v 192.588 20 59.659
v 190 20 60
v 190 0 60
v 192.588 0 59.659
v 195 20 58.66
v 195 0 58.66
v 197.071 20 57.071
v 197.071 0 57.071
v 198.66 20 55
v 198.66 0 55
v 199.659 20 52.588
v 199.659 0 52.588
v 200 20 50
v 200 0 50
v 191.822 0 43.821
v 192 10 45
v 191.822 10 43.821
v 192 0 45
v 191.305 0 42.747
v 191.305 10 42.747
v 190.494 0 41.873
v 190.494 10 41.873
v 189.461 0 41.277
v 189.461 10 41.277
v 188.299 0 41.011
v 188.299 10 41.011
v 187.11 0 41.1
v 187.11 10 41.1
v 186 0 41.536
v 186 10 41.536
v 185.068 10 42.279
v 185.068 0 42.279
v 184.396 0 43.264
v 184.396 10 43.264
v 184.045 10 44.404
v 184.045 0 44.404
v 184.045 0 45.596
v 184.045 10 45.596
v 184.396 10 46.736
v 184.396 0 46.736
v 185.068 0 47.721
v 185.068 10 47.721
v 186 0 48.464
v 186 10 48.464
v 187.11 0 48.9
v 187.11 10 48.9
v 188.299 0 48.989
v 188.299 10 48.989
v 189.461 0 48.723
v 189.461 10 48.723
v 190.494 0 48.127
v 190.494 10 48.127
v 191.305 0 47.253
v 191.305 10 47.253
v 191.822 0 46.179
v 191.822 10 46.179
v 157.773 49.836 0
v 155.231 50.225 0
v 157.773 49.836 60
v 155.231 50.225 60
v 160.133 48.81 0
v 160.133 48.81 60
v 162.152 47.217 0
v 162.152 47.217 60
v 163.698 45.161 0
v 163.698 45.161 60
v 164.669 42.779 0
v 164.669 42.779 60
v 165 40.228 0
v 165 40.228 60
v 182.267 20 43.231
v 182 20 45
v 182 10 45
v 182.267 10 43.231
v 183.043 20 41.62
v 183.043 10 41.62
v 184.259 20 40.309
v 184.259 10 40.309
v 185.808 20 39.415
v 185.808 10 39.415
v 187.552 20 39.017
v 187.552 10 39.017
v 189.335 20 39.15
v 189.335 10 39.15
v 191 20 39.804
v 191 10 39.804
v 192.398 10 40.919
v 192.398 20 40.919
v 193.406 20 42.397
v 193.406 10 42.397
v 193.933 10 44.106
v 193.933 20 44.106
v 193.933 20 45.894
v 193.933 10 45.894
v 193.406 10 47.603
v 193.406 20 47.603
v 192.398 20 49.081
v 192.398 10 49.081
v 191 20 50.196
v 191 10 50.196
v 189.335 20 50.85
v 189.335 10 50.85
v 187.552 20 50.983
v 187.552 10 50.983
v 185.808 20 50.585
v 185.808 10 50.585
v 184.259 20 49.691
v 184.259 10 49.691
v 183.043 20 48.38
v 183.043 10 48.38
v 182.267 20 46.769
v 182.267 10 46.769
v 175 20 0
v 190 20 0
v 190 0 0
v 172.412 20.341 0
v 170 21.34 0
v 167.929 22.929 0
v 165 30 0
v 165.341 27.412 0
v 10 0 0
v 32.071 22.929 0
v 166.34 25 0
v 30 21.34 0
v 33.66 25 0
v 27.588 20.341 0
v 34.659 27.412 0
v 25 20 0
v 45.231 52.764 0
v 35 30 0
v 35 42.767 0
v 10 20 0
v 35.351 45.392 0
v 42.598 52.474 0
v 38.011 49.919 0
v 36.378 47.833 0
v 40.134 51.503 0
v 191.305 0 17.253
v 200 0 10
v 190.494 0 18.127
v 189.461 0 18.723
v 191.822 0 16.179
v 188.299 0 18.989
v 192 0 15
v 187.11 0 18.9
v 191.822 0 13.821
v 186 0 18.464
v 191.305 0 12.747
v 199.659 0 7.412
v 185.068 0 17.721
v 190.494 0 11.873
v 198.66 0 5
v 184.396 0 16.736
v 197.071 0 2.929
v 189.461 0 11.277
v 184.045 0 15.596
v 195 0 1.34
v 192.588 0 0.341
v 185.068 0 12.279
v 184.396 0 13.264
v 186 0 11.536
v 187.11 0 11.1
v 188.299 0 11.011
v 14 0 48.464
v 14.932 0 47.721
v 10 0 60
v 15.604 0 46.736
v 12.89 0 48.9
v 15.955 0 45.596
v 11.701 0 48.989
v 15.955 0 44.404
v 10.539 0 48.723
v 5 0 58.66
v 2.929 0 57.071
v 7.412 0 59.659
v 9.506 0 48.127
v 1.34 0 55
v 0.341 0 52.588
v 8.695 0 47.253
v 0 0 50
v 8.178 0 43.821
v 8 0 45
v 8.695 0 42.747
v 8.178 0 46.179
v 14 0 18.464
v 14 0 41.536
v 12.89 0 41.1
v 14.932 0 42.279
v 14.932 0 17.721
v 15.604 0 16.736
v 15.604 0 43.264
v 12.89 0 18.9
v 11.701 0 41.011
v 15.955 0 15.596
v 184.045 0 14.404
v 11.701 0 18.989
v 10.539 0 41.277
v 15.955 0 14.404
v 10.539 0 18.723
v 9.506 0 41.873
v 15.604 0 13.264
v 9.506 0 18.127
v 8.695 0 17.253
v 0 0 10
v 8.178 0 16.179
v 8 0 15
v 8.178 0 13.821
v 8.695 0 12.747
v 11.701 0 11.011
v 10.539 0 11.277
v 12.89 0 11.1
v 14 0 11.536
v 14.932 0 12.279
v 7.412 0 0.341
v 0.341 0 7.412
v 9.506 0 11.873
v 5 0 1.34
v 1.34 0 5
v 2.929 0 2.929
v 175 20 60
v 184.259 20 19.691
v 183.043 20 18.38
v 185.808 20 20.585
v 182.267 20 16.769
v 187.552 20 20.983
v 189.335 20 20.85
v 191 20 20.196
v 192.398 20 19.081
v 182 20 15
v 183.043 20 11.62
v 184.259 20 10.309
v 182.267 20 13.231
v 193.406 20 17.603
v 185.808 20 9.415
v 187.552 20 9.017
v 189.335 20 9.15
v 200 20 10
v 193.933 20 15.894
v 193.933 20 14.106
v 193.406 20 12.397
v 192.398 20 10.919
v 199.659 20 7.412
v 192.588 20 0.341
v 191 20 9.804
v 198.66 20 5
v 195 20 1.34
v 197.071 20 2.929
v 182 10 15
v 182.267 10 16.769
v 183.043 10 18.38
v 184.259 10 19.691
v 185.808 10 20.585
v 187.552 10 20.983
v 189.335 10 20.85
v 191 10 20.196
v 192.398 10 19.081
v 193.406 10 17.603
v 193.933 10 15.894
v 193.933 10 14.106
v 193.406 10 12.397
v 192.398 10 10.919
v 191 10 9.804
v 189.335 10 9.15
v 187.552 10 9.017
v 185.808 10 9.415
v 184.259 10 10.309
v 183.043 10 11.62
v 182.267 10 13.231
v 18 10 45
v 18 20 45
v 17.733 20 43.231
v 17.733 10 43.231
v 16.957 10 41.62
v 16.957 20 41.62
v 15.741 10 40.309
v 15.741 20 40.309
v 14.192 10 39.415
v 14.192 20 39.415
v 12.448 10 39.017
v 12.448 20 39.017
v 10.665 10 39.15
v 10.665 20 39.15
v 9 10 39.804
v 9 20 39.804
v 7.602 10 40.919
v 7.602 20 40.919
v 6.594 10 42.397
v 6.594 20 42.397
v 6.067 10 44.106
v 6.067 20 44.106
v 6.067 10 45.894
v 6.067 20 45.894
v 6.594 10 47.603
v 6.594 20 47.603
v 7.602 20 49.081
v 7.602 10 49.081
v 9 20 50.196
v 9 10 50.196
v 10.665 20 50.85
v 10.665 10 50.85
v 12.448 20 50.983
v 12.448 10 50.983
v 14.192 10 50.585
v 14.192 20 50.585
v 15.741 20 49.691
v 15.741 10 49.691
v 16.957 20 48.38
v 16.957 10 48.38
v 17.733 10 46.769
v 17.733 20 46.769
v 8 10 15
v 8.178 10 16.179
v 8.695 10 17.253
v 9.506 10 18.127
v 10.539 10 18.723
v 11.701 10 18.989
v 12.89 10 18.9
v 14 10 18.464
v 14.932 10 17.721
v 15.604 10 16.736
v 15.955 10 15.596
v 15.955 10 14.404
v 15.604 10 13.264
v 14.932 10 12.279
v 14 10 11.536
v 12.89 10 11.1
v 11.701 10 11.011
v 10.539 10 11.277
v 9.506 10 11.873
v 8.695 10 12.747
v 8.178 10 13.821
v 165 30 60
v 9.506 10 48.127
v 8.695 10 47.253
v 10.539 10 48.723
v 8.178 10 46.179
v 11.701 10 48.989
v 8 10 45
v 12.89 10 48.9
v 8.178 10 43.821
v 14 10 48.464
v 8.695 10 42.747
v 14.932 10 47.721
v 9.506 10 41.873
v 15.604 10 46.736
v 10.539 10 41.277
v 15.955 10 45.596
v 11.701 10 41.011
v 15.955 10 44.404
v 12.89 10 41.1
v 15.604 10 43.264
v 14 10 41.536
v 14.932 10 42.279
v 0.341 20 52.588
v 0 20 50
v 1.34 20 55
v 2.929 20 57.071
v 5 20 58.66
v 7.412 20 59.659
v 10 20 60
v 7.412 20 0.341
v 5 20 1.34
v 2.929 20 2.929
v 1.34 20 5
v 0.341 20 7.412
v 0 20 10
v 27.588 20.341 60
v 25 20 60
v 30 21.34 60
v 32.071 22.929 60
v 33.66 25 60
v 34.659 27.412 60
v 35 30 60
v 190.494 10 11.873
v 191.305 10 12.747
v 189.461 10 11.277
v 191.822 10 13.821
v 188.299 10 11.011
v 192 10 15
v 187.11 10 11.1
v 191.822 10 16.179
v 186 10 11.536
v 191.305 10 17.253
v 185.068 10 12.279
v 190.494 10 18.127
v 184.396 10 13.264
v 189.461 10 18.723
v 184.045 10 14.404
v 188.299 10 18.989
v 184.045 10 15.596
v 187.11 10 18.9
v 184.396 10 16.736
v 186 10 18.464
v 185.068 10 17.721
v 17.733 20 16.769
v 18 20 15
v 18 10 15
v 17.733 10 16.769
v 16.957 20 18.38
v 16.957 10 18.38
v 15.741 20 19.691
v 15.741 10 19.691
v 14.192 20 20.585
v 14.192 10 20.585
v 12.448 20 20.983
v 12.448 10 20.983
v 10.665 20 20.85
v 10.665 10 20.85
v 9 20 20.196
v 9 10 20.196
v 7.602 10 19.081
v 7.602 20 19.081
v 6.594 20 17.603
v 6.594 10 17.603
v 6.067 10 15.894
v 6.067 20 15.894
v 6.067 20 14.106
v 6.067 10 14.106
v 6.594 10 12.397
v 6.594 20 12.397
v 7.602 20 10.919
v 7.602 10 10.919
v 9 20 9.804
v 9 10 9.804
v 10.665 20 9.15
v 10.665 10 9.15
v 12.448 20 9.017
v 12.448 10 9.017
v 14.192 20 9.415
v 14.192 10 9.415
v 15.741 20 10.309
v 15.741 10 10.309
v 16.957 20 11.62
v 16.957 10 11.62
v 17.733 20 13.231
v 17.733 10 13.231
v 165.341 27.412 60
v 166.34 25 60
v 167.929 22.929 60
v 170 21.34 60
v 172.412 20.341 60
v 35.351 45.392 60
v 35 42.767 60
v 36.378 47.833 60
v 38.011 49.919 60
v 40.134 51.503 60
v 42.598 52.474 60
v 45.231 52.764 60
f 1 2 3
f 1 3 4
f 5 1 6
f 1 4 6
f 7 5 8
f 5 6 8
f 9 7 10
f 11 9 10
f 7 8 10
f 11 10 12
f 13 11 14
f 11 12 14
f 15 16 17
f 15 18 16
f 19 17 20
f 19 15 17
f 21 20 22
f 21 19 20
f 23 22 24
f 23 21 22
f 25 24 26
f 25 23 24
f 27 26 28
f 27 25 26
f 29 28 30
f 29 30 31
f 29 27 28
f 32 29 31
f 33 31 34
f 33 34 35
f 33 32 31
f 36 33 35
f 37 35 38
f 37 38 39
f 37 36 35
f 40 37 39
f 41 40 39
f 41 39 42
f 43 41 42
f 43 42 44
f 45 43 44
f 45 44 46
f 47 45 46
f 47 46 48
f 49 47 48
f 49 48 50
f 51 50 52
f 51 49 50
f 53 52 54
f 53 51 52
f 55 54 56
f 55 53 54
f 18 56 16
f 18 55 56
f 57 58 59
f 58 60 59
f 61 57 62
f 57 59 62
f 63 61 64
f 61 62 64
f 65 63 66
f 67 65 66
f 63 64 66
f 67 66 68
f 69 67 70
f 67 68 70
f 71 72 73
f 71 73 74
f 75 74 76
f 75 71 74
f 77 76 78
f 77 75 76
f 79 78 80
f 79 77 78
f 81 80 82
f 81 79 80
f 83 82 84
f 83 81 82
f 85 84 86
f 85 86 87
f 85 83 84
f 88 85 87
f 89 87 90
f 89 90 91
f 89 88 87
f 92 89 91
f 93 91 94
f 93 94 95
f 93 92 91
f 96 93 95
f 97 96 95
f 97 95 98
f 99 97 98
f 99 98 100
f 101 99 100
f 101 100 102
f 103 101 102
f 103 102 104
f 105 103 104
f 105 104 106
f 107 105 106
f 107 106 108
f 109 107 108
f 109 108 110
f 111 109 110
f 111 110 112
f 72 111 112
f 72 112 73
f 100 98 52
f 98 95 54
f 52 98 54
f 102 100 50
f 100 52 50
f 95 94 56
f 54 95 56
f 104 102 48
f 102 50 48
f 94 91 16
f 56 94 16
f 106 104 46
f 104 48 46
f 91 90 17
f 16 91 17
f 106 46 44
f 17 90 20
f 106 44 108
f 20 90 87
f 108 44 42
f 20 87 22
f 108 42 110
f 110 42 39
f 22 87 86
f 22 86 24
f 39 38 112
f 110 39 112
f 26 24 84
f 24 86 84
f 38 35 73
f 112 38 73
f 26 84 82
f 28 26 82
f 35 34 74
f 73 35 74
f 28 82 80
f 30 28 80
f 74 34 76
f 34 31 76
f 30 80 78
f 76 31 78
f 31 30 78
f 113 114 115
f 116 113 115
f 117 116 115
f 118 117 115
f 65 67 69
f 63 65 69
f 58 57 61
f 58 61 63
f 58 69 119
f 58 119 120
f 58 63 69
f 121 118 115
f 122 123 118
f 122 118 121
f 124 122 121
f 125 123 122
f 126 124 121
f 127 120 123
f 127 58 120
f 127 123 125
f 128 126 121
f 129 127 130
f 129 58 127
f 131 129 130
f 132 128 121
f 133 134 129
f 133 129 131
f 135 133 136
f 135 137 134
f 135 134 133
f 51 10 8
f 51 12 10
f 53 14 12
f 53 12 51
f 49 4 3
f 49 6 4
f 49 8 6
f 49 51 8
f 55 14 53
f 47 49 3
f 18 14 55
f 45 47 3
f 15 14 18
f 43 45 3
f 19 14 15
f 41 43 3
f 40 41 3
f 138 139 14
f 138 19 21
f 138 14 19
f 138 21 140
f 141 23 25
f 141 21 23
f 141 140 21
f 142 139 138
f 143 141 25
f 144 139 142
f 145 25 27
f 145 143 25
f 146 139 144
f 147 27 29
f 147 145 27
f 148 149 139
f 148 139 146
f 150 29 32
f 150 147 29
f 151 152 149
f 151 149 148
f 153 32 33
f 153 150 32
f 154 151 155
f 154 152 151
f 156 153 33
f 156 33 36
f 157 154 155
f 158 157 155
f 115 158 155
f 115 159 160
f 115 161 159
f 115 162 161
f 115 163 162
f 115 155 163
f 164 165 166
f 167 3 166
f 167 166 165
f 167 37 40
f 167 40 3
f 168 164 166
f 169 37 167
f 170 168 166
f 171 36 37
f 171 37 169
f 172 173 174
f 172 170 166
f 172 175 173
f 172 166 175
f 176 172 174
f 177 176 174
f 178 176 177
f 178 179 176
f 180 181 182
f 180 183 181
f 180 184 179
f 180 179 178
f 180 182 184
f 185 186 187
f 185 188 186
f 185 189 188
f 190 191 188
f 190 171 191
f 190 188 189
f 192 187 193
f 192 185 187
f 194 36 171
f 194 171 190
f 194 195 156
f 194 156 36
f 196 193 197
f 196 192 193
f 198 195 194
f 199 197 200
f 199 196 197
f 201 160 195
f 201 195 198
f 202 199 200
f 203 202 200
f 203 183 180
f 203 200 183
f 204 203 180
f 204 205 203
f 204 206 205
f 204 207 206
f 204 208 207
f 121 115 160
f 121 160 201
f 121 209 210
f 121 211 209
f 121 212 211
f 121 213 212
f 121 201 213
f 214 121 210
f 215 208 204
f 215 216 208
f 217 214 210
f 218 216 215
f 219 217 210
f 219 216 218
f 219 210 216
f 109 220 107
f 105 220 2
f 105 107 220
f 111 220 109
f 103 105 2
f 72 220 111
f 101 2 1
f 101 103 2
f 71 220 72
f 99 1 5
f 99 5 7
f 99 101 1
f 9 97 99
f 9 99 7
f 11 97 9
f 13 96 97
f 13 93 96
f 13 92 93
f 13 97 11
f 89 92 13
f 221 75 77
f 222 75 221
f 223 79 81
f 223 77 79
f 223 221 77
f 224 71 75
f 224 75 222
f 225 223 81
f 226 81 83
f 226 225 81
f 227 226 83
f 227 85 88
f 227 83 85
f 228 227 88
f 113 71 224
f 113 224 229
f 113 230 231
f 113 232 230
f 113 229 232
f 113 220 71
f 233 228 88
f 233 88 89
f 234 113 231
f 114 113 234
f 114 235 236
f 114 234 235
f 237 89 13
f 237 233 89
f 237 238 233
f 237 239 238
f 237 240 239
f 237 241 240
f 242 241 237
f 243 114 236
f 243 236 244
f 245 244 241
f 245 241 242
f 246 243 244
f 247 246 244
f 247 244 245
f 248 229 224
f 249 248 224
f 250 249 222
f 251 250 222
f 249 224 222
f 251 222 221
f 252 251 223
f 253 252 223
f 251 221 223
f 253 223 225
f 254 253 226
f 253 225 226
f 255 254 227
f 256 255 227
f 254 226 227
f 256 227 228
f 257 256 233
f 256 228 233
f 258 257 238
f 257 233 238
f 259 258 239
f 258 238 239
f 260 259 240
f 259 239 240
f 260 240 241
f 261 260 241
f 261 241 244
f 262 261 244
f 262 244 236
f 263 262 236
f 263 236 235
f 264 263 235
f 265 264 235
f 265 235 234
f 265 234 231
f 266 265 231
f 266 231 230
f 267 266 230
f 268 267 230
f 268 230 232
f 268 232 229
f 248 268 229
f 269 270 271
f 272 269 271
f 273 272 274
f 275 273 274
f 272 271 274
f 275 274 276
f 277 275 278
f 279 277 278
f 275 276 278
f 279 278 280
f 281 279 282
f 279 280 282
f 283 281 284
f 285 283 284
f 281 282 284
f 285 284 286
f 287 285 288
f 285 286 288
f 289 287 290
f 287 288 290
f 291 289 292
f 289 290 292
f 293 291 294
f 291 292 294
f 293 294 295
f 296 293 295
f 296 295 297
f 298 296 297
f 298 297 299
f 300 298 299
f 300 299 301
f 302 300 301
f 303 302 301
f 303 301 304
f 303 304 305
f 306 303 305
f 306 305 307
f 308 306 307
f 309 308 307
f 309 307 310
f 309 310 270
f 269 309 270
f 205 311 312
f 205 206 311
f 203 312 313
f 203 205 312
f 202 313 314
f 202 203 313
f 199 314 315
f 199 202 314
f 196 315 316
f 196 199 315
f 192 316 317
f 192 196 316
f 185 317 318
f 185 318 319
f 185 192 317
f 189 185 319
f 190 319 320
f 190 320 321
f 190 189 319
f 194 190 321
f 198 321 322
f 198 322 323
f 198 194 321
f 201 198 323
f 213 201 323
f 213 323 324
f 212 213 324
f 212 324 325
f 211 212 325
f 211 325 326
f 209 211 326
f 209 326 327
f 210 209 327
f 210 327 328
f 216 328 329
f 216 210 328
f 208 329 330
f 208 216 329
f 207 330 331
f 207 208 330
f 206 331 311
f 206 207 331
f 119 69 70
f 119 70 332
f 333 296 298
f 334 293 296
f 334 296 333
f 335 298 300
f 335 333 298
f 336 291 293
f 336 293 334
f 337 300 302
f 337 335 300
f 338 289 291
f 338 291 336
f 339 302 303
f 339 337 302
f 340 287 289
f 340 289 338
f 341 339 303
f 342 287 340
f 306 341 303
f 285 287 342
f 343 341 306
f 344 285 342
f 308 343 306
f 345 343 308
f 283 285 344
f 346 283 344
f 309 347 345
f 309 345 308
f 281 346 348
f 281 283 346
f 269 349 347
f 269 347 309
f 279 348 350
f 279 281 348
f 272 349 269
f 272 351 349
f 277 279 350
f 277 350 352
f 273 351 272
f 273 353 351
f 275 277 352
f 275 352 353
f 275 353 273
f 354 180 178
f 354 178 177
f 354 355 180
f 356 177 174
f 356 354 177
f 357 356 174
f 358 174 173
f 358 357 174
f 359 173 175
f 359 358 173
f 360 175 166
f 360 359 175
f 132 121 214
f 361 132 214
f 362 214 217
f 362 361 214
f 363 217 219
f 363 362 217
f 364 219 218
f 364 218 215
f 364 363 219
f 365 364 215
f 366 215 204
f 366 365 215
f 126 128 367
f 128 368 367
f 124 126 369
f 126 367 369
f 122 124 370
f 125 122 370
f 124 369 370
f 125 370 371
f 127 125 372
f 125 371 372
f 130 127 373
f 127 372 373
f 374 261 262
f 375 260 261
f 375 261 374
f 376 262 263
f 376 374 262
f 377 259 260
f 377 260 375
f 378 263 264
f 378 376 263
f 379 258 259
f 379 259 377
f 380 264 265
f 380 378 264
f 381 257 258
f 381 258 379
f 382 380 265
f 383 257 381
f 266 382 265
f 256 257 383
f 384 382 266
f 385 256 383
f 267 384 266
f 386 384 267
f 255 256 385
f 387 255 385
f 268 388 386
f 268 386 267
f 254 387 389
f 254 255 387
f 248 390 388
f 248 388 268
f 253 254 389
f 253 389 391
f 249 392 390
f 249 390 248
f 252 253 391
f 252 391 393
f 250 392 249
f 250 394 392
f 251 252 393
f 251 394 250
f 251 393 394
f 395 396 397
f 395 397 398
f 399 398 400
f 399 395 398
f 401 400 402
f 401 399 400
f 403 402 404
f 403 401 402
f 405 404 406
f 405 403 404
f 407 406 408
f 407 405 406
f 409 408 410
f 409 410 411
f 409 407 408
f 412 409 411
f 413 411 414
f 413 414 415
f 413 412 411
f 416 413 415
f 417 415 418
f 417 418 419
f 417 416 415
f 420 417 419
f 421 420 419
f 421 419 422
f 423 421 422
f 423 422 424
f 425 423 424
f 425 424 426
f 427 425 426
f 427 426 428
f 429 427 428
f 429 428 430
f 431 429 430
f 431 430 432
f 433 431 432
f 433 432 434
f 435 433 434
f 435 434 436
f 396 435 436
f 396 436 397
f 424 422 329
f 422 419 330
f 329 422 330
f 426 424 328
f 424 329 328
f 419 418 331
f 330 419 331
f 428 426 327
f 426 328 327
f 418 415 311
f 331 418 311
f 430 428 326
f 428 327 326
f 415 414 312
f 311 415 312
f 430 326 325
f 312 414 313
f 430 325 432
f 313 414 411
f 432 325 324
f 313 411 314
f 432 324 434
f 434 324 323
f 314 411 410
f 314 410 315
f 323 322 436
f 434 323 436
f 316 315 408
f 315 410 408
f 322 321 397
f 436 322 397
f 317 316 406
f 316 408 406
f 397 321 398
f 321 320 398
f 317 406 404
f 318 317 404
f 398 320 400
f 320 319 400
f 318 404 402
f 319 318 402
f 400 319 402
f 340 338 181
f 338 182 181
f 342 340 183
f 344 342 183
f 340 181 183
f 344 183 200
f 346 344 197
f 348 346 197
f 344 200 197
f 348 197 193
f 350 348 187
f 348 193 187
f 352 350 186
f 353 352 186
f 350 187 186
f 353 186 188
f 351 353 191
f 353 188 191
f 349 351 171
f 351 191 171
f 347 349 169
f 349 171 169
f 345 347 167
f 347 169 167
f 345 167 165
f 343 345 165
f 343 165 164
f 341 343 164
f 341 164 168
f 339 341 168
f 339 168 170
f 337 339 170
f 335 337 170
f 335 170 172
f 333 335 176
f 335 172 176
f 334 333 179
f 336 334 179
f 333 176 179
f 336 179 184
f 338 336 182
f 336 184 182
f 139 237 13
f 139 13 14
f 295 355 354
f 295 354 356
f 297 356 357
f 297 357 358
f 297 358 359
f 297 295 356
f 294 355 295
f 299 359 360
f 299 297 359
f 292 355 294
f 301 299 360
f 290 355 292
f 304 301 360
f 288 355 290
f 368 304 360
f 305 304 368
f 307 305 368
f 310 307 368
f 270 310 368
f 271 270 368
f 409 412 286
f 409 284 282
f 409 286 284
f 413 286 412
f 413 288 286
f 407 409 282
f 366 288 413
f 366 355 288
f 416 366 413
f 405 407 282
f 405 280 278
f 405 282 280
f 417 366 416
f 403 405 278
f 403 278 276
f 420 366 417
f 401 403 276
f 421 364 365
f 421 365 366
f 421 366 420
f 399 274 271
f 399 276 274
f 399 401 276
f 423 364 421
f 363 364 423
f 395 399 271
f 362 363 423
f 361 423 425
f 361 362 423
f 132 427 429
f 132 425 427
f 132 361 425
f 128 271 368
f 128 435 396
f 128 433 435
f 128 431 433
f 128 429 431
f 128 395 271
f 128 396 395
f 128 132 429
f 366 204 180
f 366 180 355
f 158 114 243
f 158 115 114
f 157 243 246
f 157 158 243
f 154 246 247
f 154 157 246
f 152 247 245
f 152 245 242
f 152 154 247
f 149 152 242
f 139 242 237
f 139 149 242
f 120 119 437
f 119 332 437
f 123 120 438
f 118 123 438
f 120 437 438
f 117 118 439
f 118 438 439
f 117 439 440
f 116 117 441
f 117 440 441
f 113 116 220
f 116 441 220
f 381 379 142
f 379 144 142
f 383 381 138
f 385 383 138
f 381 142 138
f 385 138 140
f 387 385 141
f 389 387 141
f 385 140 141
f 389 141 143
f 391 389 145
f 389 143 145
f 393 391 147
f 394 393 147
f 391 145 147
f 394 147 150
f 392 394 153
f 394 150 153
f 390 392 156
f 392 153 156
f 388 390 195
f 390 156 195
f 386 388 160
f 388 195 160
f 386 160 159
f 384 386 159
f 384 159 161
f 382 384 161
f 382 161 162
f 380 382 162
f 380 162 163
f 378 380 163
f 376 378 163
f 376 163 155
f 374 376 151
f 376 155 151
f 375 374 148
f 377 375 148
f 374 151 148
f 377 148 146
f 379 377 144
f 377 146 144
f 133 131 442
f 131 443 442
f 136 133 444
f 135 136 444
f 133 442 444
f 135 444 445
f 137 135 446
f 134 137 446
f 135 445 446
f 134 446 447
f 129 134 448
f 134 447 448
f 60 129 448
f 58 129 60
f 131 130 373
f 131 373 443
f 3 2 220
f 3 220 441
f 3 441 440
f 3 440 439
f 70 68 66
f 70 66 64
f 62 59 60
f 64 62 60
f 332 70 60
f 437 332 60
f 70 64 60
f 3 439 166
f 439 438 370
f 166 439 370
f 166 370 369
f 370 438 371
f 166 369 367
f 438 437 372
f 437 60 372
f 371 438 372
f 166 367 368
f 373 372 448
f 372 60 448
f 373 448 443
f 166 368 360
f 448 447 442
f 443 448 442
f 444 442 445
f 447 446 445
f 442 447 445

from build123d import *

# Parameters (mm, degrees)
BOSS_EXTRUDE1_DEPTH                     = 60
CBORE_FOR_M5_HEX_HEAD_BOLT1_D           = 8
CBORE_FOR_M5_HEX_HEAD_BOLT1_CBORE_D     = 12
CBORE_FOR_M5_HEX_HEAD_BOLT1_CBORE_DEPTH = 10
MIRROR2_COPY_1_D                        = 8
MIRROR2_COPY_1_CBORE_D                  = 12
MIRROR2_COPY_1_CBORE_DEPTH              = 10
FILLET1_R                               = 10
FILLET2_R                               = 10


with BuildPart() as part:
    # Sketch1 → Boss-Extrude1 (new body)
    with BuildSketch(Plane.XY):
        Polygon((0, 0), (0, 20), (35, 20), (35, 53), (165, 50), (165, 20), (200, 20), (200, 0), align=None)
    extrude(amount=BOSS_EXTRUDE1_DEPTH)

    # CBORE for M5 Hex Head Bolt1 (through all)
    with Locations(Plane(origin=(0, 20, 0), x_dir=(1, 0, 0), z_dir=(0, 1, 0))):
        with Locations((12, -45)):
            cbore_for_m5_hex_head_bolt1 = CounterBoreHole(CBORE_FOR_M5_HEX_HEAD_BOLT1_D / 2, CBORE_FOR_M5_HEX_HEAD_BOLT1_CBORE_D / 2, CBORE_FOR_M5_HEX_HEAD_BOLT1_CBORE_DEPTH)

    # Mirror1: CBORE for M5 Hex Head Bolt1 across plane
    add(cbore_for_m5_hex_head_bolt1.mirror(Plane.XY.offset(30)), mode=Mode.SUBTRACT)

    # Mirror2: CBORE for M5 Hex Head Bolt1 across plane
    add(cbore_for_m5_hex_head_bolt1.mirror(Plane(origin=(100, 0, 0), x_dir=(0, 0, 1), z_dir=(1, 0, 0))), mode=Mode.SUBTRACT)

    # Mirror2 copy 1 (through all)
    with Locations(Plane(origin=(200, 20, 60), x_dir=(-1, 0, 0), z_dir=(0, 1, 0))):
        with Locations((12, -45)):
            CounterBoreHole(MIRROR2_COPY_1_D / 2, MIRROR2_COPY_1_CBORE_D / 2, MIRROR2_COPY_1_CBORE_DEPTH)

    # Fillet1
    fillet1_edges = [part.edges().sort_by_distance(p)[0] for p in [
        (165, 20, 30),
        (165, 50, 30),
        (35, 53, 30),
        (35, 20, 30),
    ]]
    fillet(fillet1_edges, radius=FILLET1_R)

    # Fillet2
    fillet2_edges = [part.edges().sort_by_distance(p)[0] for p in [
        (0, 10, 0),
        (200, 10, 0),
        (0, 10, 60),
        (200, 10, 60),
    ]]
    fillet(fillet2_edges, radius=FILLET2_R)


solid = part.part
